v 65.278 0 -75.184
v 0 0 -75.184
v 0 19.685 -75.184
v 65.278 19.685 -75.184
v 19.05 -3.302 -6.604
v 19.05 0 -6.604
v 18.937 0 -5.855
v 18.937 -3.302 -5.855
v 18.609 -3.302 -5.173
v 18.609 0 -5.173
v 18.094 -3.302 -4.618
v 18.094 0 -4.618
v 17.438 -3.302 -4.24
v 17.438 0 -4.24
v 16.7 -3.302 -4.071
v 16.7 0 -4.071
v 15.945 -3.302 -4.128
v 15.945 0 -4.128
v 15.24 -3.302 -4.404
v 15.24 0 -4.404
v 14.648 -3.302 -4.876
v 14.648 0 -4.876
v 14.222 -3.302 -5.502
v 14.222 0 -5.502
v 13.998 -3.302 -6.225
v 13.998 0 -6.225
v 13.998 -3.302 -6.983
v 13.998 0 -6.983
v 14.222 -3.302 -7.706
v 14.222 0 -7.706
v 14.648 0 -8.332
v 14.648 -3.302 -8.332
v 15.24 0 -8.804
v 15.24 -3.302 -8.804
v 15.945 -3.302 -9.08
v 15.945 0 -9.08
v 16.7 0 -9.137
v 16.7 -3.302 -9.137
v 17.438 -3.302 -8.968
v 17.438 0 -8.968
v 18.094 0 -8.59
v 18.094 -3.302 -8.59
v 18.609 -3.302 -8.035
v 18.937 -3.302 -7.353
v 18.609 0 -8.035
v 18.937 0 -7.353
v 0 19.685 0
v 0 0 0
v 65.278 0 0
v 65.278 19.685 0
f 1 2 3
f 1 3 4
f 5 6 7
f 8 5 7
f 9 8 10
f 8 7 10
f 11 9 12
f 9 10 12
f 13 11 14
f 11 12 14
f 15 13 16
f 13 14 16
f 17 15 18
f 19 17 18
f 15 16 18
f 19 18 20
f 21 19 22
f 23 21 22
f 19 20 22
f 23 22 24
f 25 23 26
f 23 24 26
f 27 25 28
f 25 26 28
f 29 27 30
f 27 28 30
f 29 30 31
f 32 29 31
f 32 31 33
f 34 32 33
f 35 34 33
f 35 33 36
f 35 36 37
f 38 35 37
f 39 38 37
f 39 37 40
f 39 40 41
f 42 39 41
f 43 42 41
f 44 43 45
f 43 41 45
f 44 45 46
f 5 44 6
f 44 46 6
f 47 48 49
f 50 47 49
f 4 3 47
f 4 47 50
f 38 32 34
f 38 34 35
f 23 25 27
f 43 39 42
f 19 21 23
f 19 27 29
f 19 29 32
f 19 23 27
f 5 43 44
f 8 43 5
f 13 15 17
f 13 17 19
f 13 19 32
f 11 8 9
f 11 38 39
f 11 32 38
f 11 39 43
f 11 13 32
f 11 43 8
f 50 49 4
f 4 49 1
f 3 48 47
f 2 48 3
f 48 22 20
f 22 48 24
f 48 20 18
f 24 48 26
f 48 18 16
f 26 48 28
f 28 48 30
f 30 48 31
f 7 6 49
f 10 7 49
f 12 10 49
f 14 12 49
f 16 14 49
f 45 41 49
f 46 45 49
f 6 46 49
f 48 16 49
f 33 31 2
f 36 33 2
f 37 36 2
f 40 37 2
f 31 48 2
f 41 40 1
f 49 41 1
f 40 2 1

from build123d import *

# Parameters (mm, degrees)
SKETCH1_W           = 65.278
SKETCH1_H           = 75.184
BOSS_EXTRUDE1_DEPTH = 19.685
SKETCH3_R           = 2.54
BOSS_EXTRUDE2_DEPTH = 3.302


with BuildPart() as part:
    # Sketch1 → Boss-Extrude1 (new body)
    with BuildSketch(Plane(origin=(0, 0, 0), x_dir=(1, 0, 0), z_dir=(0, 1, 0))):
        with Locations((32.639, 37.592)):
            Rectangle(SKETCH1_W, SKETCH1_H)
    extrude(amount=BOSS_EXTRUDE1_DEPTH)

    # Sketch3 → Boss-Extrude2 (add)
    with BuildSketch(Plane.XZ):
        with Locations((16.51, -6.604)):
            Circle(SKETCH3_R)
    extrude(amount=BOSS_EXTRUDE2_DEPTH)


solid = part.part
